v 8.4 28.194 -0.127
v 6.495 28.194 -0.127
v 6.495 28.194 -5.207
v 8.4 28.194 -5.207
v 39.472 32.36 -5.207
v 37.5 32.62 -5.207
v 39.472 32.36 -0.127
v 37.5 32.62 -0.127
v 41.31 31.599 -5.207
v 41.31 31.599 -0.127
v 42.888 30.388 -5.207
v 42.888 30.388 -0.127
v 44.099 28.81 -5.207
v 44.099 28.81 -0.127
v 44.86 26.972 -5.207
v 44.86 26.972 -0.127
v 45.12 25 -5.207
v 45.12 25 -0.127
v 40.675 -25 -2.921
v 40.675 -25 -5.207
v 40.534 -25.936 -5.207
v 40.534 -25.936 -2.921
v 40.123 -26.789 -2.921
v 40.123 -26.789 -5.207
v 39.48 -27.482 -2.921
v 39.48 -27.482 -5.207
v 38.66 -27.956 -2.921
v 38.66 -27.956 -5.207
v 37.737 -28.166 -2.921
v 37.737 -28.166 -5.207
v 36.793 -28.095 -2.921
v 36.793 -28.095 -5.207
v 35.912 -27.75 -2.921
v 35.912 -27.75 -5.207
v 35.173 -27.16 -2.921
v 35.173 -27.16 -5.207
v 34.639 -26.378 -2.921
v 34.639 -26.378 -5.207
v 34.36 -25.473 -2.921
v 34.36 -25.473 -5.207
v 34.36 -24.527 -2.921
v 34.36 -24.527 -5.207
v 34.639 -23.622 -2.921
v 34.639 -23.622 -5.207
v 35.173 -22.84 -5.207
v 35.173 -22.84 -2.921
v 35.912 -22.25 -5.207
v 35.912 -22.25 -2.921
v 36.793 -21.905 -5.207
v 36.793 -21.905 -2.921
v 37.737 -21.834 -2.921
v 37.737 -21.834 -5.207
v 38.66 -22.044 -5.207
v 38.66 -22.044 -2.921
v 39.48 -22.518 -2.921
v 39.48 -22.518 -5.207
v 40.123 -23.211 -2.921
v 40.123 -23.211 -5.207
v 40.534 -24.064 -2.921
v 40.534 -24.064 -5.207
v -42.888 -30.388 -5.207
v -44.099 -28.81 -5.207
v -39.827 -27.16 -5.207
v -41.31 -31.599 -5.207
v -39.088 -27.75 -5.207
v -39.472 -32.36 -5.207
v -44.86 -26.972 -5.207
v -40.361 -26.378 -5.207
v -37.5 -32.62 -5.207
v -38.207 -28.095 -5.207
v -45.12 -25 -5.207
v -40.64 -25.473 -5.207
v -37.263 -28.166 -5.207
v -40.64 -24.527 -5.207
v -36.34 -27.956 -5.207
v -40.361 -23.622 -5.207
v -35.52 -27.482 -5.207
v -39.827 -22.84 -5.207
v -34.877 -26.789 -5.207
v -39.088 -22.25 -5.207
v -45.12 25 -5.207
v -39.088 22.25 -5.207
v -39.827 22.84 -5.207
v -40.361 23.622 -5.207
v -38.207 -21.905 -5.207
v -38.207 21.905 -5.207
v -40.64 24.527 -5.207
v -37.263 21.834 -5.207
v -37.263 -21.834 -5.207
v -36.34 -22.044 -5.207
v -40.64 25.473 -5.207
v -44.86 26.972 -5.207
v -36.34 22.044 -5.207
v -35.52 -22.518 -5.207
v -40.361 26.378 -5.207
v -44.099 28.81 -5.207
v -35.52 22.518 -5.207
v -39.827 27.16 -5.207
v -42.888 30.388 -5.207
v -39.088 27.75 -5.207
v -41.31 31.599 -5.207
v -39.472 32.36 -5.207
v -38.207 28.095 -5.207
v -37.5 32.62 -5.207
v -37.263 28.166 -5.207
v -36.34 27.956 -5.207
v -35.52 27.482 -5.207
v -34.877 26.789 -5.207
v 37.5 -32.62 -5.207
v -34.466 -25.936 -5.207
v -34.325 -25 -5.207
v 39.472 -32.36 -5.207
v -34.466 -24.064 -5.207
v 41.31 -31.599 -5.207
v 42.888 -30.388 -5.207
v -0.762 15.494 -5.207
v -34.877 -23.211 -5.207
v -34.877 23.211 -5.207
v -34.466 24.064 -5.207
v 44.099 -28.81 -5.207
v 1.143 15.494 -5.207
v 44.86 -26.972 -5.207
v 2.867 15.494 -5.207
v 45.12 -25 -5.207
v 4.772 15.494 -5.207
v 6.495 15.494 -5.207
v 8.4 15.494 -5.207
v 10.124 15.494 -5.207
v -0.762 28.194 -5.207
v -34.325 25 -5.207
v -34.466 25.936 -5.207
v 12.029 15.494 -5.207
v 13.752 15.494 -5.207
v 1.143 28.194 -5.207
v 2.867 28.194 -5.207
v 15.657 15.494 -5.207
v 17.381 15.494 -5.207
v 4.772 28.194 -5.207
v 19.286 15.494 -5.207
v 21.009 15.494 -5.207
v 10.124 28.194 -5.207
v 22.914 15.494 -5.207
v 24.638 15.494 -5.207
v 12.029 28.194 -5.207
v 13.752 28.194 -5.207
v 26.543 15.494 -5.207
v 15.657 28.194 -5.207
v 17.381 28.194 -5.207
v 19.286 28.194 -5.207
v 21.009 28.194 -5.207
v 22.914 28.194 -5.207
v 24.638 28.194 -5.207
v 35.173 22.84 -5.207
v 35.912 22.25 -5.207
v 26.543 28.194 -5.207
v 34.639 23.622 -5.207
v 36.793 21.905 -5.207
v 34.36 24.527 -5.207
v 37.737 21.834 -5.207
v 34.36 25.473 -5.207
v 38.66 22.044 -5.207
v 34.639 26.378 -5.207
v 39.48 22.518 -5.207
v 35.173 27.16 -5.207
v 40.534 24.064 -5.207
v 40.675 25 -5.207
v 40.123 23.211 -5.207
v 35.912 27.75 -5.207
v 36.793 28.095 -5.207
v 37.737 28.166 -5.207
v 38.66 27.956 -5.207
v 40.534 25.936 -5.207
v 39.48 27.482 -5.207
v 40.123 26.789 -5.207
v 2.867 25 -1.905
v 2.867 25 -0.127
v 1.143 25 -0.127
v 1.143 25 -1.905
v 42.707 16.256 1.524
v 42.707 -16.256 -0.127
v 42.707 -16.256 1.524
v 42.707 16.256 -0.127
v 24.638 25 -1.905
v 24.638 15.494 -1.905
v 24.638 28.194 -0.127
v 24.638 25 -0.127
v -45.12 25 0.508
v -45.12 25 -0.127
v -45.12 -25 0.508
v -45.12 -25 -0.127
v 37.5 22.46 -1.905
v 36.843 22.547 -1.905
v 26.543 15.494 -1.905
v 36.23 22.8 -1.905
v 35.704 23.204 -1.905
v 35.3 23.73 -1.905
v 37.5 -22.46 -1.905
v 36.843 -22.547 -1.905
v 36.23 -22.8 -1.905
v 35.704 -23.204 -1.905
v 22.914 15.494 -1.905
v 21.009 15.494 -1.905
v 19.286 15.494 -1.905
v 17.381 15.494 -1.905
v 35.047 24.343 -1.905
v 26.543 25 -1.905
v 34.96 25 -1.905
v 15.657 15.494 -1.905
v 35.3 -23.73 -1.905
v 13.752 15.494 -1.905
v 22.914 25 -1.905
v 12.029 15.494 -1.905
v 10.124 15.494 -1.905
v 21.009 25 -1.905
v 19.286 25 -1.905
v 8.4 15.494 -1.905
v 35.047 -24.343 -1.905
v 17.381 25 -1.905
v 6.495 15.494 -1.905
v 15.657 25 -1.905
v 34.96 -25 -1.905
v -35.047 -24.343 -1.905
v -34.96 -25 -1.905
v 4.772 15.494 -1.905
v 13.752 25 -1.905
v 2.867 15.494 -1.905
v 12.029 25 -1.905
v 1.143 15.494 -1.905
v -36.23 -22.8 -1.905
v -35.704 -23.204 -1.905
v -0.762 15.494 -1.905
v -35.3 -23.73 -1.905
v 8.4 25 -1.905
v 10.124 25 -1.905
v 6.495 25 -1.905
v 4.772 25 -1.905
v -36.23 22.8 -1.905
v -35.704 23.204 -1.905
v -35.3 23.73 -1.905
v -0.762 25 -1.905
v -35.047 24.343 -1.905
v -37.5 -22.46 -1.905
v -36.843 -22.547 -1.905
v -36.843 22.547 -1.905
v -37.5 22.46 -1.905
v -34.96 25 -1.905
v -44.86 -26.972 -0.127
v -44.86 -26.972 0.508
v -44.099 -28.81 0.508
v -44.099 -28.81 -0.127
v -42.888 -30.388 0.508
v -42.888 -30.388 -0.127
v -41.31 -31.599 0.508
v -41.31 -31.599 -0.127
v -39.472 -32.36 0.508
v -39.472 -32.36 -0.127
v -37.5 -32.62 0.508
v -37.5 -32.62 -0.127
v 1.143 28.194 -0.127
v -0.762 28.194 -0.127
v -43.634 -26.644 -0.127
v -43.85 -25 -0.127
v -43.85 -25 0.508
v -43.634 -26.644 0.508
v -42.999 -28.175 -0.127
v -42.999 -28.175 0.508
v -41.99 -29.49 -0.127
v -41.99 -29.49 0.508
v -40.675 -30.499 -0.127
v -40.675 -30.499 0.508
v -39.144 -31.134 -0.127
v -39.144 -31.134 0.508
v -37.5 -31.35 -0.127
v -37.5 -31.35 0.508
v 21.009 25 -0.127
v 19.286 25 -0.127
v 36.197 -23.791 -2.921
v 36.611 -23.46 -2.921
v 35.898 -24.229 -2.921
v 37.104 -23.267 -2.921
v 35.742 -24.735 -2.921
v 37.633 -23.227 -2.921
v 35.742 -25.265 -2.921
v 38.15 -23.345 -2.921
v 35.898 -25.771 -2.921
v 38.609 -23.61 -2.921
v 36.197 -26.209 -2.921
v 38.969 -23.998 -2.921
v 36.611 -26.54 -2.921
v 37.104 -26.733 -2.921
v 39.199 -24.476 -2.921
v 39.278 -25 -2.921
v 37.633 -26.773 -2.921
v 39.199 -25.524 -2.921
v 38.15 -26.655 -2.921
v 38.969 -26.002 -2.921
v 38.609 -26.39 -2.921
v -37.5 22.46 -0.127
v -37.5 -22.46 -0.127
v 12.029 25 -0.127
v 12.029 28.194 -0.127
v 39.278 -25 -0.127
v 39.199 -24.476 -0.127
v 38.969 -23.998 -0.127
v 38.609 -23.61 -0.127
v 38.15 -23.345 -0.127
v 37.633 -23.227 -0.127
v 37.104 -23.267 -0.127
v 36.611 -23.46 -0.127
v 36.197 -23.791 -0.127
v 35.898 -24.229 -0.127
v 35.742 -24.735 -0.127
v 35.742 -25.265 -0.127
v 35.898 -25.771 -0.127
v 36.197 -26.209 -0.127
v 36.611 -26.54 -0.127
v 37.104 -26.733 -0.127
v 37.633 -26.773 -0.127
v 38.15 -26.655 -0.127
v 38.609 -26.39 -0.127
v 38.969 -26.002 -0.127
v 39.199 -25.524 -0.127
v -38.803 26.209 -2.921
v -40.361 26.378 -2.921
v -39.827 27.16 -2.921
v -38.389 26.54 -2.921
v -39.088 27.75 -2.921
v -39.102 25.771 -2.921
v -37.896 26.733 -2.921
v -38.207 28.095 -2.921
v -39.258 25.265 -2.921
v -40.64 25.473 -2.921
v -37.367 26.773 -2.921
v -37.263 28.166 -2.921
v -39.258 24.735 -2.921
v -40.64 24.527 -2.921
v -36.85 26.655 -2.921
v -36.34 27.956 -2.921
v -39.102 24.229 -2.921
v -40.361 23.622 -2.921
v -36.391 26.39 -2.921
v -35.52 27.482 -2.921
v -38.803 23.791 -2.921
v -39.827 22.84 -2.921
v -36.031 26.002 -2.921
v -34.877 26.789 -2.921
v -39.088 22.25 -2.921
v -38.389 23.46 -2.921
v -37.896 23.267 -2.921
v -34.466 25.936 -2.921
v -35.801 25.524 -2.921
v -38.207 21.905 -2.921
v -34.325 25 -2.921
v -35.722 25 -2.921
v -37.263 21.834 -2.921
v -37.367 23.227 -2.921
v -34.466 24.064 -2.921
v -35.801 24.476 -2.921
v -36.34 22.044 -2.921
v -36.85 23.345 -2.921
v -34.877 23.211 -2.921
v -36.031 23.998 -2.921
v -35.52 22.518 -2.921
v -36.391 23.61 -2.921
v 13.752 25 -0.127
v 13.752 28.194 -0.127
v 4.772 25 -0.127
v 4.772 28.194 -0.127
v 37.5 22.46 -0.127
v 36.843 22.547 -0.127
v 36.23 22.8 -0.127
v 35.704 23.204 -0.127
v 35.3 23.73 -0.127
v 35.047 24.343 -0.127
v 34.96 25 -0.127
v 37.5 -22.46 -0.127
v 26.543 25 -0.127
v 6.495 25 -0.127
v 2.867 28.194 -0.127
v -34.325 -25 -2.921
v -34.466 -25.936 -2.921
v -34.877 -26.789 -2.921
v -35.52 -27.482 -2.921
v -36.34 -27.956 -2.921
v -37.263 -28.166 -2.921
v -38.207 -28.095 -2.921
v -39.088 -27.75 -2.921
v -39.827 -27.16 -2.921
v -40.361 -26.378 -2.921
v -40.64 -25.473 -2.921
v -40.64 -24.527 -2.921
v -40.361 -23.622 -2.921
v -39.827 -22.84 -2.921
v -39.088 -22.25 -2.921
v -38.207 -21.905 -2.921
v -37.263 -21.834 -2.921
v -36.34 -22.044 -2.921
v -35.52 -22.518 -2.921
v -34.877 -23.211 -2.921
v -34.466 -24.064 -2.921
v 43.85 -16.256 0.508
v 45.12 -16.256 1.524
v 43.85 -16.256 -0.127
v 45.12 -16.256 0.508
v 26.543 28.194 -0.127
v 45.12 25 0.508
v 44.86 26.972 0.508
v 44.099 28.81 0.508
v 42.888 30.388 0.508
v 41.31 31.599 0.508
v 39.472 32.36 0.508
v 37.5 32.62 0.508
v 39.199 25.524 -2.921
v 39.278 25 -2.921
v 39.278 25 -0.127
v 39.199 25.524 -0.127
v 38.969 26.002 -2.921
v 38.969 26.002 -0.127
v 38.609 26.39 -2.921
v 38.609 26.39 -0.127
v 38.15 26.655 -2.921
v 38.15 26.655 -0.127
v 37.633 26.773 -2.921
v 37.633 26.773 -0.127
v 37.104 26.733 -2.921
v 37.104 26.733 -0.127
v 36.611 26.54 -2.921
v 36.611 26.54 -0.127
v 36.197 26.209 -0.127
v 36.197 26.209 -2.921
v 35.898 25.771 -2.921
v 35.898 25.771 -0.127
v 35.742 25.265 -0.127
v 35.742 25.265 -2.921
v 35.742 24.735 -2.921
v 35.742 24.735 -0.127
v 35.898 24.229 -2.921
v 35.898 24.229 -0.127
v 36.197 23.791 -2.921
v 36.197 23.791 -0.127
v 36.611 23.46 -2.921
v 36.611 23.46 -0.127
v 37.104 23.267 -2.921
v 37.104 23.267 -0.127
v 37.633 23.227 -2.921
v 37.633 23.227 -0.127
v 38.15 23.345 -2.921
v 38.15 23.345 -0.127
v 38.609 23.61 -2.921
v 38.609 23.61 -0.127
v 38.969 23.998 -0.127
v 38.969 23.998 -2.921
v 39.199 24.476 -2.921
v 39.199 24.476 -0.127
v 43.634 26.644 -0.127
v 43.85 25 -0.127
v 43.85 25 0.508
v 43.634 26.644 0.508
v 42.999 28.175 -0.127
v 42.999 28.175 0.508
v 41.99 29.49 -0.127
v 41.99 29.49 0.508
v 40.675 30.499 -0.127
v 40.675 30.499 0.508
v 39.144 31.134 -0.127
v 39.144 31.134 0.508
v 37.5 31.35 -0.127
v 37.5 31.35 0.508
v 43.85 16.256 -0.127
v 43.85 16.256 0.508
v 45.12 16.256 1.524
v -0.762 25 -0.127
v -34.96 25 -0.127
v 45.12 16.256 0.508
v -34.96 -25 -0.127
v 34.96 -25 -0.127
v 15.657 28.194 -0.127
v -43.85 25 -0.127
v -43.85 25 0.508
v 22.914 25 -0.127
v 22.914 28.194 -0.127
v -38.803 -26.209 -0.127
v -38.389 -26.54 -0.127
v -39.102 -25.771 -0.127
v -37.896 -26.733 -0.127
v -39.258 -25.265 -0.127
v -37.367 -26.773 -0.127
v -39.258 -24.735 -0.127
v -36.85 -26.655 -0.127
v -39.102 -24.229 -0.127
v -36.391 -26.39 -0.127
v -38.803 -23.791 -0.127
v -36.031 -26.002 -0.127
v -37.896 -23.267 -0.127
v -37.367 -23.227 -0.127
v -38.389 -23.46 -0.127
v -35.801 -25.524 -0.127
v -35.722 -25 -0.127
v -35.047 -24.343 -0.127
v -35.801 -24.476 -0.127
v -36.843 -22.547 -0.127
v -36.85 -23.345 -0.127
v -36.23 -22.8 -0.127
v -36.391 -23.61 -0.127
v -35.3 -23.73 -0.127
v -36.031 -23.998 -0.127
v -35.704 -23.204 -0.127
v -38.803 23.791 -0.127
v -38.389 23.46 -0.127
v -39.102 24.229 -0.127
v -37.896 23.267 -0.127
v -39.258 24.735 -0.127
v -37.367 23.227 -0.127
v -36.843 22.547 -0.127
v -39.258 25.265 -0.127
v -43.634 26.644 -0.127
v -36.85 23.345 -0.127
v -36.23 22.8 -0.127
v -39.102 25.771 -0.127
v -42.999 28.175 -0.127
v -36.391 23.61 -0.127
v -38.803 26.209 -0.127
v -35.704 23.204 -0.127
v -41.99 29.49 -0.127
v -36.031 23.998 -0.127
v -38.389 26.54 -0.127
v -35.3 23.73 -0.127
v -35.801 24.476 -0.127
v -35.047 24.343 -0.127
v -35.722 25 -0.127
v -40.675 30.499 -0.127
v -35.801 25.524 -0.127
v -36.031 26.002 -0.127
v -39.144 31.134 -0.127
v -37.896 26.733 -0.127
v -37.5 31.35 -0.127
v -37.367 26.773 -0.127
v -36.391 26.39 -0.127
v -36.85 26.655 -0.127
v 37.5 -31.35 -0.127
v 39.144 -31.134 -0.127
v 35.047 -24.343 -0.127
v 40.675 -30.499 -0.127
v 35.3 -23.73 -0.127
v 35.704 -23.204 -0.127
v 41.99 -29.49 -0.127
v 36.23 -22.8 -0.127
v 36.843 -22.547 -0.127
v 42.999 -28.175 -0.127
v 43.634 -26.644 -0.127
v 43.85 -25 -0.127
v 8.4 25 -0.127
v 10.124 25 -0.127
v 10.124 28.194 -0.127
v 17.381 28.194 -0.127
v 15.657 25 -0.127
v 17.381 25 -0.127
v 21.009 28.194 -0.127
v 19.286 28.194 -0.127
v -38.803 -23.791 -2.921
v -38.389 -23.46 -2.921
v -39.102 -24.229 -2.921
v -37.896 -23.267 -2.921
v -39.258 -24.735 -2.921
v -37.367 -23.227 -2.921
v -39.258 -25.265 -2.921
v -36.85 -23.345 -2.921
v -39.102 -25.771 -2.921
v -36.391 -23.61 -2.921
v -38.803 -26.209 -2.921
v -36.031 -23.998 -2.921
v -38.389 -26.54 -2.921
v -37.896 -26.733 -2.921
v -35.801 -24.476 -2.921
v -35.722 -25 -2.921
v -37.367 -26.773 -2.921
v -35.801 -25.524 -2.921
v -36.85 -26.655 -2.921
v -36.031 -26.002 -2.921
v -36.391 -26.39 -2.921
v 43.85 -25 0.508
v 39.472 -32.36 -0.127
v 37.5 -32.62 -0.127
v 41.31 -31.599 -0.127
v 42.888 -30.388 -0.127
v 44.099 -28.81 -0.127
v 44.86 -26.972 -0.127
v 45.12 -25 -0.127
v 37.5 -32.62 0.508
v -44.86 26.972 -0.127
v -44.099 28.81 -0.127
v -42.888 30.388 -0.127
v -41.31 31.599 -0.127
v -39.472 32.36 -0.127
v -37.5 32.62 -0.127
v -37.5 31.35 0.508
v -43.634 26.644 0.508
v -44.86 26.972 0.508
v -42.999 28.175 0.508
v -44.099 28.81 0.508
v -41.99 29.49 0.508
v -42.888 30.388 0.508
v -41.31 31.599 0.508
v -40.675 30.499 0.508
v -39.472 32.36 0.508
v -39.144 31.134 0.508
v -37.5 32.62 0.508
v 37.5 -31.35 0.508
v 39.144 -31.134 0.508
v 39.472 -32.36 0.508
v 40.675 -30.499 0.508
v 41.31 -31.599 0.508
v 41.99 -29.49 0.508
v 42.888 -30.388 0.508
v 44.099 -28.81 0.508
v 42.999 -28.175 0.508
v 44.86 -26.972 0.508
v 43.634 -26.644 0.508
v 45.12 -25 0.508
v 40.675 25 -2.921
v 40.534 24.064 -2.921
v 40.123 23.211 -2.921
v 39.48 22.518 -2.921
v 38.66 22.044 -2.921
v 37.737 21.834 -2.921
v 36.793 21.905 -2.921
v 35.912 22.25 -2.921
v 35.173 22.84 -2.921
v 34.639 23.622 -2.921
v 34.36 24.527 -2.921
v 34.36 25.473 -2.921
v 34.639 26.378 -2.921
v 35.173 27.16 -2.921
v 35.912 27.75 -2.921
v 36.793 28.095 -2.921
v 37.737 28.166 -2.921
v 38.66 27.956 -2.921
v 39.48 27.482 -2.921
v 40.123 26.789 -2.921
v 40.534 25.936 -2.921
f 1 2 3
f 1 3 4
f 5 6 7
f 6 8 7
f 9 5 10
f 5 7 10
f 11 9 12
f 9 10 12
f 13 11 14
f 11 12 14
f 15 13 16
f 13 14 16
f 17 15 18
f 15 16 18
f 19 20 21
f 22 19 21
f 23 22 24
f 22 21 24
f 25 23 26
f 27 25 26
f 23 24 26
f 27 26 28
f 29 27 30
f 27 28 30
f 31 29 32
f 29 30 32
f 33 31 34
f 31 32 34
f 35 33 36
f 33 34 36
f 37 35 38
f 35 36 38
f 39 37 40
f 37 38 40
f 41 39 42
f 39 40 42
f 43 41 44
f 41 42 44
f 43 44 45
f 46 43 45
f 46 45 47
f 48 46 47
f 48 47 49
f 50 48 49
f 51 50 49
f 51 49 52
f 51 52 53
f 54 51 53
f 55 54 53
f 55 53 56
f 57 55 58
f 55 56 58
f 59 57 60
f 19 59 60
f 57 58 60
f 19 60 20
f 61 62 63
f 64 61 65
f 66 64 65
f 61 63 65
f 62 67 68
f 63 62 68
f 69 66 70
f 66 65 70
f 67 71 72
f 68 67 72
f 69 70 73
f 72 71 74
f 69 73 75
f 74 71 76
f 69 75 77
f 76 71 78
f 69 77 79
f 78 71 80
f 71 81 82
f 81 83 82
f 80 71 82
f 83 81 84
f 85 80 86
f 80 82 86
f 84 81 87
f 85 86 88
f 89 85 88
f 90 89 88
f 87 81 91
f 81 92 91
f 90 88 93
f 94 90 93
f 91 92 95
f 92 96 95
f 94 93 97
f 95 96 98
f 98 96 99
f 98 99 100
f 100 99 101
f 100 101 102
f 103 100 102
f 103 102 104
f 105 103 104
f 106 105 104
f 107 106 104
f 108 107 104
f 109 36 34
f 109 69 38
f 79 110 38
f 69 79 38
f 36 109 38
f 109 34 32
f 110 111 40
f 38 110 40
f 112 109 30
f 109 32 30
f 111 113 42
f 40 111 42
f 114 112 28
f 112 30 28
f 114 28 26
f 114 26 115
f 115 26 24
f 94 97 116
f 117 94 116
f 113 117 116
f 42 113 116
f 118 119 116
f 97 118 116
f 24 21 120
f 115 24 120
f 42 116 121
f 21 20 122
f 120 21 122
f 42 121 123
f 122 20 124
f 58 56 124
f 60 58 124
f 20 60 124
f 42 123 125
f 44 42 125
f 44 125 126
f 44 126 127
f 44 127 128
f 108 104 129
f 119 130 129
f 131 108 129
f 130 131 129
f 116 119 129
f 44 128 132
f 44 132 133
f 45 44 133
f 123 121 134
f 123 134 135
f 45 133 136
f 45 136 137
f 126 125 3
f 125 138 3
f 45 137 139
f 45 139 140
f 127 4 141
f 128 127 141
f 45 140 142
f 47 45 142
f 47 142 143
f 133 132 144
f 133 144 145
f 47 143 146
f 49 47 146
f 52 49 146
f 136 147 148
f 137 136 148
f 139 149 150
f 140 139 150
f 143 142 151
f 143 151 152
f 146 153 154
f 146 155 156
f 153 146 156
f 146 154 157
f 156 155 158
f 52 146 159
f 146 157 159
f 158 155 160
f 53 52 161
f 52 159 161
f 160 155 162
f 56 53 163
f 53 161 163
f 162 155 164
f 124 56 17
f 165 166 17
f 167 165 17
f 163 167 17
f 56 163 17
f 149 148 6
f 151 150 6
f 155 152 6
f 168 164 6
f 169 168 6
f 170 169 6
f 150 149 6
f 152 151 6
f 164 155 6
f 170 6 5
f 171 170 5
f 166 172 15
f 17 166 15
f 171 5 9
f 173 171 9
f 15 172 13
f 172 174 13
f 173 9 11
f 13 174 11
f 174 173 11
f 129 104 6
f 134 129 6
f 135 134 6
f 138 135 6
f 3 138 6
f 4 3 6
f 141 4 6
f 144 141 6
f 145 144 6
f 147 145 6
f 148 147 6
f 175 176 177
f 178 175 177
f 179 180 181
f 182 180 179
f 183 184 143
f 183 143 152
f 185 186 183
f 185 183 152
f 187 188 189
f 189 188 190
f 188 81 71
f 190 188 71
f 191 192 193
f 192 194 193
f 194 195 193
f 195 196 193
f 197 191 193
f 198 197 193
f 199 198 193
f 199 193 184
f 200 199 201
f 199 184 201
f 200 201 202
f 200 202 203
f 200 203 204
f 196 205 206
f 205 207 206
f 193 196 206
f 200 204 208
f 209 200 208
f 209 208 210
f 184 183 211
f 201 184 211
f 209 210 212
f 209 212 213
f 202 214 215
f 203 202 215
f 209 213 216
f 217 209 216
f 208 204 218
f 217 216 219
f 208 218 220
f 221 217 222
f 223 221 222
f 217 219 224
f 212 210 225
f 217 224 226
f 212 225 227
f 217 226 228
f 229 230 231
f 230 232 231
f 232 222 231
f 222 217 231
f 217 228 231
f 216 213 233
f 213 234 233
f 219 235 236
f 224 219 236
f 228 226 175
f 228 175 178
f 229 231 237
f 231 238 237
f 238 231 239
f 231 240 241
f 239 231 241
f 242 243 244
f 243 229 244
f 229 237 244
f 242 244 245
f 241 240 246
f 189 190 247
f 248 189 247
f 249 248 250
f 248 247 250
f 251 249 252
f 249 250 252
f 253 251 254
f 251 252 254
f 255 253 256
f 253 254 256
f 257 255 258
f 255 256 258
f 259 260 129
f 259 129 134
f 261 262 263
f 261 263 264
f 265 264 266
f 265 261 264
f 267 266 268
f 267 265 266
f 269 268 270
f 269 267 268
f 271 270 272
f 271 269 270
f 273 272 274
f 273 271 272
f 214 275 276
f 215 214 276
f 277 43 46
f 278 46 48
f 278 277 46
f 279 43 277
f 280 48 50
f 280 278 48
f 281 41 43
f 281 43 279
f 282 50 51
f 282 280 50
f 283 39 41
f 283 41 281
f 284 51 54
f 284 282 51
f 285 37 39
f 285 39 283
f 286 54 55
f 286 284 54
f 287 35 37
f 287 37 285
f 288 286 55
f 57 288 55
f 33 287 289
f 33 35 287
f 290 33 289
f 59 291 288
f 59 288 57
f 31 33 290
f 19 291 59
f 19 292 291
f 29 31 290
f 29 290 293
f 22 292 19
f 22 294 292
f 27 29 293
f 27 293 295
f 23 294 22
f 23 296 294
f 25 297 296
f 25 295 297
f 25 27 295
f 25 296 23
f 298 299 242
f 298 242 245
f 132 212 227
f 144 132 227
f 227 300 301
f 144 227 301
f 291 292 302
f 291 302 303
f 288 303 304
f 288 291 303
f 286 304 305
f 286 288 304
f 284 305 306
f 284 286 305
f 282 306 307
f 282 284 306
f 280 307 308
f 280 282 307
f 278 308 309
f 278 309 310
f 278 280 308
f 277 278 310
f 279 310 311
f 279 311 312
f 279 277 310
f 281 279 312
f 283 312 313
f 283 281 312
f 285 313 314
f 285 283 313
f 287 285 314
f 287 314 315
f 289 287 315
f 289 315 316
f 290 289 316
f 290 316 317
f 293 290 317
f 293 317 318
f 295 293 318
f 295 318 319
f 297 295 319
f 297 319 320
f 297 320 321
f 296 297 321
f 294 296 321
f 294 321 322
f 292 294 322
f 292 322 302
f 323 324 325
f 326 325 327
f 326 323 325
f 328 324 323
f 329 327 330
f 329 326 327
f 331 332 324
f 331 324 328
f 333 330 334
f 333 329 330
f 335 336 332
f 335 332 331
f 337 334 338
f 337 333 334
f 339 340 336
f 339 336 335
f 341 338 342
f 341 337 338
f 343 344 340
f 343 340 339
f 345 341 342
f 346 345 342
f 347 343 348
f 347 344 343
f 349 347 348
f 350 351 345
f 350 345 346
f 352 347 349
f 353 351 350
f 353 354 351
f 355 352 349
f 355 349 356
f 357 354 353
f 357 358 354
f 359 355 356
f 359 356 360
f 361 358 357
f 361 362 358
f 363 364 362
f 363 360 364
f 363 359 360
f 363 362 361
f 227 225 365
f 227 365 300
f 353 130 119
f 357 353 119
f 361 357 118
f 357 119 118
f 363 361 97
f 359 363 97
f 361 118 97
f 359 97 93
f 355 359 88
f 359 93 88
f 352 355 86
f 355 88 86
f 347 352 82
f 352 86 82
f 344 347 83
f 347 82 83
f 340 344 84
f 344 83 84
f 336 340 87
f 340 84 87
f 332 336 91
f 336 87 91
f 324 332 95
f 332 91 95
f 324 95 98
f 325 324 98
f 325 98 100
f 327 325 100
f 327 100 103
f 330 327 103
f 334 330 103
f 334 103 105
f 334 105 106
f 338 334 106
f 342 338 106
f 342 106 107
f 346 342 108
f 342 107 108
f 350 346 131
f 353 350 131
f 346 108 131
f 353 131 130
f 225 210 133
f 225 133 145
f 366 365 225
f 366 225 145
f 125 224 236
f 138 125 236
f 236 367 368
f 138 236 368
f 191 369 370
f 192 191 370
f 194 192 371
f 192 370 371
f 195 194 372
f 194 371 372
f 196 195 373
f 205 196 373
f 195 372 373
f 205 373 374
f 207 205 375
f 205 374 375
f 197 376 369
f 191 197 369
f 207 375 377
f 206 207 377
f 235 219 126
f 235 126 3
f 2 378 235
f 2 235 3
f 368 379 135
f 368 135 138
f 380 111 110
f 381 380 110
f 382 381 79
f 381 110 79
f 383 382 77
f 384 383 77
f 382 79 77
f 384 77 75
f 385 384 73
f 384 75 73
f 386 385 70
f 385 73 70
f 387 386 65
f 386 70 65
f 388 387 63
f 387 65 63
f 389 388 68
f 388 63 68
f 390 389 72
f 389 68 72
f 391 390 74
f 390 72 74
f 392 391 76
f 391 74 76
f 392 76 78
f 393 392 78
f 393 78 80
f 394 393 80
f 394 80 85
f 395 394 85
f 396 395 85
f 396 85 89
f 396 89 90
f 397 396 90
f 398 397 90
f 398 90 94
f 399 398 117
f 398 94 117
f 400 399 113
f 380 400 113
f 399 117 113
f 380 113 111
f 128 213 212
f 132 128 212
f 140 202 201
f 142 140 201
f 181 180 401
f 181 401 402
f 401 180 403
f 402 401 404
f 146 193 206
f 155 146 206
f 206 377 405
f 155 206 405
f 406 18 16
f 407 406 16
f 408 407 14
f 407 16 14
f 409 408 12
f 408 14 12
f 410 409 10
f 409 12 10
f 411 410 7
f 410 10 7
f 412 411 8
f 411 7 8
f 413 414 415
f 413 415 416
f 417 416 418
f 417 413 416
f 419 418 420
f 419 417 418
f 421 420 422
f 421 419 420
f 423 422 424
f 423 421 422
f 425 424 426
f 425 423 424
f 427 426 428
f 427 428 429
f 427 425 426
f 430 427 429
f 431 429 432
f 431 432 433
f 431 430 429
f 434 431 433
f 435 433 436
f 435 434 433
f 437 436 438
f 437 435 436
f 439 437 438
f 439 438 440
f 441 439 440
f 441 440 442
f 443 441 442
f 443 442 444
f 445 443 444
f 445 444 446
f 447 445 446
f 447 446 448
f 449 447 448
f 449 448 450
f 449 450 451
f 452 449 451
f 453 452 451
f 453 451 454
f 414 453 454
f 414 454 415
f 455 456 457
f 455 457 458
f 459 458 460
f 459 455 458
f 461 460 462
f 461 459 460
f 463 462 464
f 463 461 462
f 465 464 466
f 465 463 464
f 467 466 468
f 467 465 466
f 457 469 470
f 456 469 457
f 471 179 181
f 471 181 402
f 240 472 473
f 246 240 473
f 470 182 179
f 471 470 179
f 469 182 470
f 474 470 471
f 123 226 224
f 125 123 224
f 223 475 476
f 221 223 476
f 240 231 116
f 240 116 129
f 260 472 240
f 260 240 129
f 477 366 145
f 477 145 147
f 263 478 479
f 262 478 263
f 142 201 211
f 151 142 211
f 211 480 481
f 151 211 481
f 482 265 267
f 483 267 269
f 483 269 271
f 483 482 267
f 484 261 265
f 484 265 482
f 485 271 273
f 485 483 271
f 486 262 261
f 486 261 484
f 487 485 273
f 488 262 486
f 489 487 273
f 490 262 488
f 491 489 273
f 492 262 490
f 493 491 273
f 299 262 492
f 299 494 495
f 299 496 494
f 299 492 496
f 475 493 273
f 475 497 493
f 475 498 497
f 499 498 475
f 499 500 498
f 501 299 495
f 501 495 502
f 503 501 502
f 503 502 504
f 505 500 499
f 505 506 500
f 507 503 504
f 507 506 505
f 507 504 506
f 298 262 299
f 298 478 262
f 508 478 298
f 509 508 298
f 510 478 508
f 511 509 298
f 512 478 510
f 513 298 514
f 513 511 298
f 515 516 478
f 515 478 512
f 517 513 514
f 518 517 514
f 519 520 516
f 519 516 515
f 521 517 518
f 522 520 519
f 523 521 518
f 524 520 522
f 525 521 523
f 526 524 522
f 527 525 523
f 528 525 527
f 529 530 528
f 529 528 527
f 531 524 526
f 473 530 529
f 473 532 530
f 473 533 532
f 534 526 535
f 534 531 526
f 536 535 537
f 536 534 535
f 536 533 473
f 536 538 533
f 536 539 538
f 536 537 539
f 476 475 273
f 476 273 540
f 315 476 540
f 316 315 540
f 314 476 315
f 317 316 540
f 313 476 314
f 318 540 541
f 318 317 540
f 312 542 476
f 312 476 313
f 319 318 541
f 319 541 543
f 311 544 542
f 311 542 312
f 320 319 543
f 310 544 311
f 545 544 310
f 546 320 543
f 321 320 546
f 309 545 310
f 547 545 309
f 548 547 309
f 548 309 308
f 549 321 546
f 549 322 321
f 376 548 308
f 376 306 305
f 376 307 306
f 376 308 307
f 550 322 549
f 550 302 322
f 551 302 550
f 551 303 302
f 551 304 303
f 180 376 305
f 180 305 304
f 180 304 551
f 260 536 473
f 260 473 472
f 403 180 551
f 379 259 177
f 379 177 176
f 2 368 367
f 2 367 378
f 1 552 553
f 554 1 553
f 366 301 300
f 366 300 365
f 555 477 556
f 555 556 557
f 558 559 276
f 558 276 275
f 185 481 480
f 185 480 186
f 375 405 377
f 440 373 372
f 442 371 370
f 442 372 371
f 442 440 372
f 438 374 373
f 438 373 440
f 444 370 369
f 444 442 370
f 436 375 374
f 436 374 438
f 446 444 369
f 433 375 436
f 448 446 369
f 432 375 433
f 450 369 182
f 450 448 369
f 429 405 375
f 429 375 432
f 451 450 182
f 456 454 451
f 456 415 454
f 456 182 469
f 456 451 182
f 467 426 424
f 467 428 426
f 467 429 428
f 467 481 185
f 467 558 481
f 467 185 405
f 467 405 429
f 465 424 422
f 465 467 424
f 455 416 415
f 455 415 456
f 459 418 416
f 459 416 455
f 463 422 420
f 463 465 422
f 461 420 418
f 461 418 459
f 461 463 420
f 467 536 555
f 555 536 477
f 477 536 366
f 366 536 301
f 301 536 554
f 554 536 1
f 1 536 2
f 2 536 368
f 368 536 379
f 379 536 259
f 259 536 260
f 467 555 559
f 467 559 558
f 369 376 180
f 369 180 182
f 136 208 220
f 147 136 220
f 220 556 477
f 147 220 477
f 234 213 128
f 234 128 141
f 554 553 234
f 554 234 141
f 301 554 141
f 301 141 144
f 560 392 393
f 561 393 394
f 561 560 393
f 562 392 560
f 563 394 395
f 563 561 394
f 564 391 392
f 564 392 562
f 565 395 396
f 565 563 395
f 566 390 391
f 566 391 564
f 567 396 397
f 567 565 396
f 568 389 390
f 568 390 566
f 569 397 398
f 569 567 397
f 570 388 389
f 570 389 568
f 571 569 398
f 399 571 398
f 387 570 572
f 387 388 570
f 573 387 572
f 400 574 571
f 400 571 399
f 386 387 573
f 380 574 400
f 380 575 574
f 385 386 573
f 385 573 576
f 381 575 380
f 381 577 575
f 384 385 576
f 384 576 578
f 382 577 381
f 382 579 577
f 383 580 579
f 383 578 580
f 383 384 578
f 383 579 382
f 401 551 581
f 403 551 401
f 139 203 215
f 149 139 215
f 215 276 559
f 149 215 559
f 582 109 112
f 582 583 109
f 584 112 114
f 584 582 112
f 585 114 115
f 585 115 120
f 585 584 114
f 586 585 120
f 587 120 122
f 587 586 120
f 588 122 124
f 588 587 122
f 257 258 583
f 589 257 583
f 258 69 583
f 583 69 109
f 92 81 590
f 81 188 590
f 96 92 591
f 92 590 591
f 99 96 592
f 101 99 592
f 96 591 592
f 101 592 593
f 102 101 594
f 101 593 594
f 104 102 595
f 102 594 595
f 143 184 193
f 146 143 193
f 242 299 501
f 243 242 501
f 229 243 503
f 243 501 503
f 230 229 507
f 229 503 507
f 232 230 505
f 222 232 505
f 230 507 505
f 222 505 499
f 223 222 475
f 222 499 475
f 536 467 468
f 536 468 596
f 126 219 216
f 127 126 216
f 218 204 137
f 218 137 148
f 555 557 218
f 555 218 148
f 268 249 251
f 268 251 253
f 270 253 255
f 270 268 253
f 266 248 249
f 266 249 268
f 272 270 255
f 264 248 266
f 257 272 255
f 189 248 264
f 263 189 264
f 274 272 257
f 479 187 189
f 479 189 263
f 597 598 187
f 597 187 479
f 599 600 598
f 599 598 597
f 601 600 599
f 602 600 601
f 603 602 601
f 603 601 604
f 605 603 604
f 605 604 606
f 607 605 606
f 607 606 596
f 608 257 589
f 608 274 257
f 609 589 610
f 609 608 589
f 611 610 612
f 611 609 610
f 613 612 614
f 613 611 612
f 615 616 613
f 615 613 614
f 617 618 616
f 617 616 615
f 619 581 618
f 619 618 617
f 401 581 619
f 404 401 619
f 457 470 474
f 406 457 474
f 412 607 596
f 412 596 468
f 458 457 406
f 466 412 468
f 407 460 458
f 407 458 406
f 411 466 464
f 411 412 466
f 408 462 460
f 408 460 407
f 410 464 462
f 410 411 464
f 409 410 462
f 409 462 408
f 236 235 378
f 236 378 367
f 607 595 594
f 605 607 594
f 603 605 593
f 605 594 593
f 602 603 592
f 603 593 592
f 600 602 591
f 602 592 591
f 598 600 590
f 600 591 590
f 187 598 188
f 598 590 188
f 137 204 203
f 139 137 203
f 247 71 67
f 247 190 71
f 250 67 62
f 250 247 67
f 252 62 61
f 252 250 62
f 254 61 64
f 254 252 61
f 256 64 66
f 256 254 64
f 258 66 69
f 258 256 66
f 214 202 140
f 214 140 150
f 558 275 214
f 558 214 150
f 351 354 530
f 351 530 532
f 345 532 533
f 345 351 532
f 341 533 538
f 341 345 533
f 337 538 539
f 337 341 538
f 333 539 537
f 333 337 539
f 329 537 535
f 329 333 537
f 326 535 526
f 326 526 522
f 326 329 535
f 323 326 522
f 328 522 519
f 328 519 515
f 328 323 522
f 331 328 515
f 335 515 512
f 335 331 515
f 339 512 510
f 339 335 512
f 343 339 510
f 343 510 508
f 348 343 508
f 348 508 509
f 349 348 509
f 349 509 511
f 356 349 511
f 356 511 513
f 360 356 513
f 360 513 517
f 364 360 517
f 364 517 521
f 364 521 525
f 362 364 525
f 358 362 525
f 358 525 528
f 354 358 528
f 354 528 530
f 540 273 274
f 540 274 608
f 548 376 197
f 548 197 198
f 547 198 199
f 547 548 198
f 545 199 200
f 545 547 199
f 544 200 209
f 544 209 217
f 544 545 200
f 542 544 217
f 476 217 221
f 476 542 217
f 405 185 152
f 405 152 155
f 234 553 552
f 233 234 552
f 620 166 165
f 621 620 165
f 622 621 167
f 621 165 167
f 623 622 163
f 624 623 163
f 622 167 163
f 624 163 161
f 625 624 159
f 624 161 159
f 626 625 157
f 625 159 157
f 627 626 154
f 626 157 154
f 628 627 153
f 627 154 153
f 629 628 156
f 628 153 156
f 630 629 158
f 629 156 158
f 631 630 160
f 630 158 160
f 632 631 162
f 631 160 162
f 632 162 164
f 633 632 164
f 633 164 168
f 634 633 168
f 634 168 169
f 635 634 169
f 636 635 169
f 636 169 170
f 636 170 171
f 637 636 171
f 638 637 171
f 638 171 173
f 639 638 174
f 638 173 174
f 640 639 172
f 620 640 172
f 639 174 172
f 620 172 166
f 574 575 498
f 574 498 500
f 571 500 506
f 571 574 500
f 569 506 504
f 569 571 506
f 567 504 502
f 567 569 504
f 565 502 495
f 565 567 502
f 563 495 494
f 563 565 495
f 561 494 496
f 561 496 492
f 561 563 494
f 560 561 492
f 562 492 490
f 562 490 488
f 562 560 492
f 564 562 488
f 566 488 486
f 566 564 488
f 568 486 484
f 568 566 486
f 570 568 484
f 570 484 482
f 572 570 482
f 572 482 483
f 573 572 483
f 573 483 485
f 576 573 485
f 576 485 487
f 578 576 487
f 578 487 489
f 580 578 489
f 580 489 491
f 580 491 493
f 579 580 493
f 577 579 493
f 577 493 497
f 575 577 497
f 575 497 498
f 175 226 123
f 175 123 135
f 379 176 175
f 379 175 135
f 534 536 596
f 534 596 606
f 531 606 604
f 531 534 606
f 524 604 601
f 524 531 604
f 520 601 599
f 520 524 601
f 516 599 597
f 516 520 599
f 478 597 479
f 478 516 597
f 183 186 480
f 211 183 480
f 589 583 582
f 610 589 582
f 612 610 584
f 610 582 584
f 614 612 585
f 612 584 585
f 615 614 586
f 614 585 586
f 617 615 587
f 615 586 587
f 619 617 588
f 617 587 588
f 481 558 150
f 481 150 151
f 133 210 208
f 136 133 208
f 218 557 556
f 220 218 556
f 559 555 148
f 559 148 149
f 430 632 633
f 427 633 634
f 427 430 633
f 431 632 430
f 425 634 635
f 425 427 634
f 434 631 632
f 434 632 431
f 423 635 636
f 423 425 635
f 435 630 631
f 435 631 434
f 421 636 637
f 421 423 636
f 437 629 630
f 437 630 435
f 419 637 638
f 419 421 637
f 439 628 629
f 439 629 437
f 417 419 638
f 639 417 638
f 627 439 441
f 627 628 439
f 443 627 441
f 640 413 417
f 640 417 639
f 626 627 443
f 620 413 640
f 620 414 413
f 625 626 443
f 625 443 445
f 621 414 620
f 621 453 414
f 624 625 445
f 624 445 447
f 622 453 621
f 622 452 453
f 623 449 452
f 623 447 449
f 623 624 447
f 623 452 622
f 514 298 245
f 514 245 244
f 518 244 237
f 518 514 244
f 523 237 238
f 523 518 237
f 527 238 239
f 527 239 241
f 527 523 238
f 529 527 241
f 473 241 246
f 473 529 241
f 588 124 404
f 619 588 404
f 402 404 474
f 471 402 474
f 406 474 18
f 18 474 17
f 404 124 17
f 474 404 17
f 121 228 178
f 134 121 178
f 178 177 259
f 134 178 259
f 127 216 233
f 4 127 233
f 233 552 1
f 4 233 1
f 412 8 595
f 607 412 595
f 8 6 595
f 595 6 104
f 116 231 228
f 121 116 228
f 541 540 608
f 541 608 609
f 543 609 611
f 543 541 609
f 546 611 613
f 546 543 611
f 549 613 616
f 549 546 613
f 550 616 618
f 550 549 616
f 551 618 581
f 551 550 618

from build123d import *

# Parameters (mm, degrees)
SKETCH_W                = 90.24
SKETCH_H                = 65.24
SKETCH_R                = 1.778
PAD_DEPTH               = 5.08
POCKET_DEPTH            = 1.778
POCKET_MIRRORED_2_DEPTH = 1.778
SKETCH002_R             = 3.175
POCKET001_DEPTH         = 2.286
SKETCH003_W             = 1.905
SKETCH003_H             = 12.7
POCKET002_DEPTH         = 5.081
LINEARPATTERN_COUNT     = 8
LINEARPATTERN_PITCH     = 3.628571
FILLET_R                = 7.62
PAD001_DEPTH            = 0.635
SKETCH020_W             = 2.413
SKETCH020_H             = 32.512
PAD005_DEPTH            = 1.651


with BuildPart() as part:
    # Sketch → Pad (new body)
    with BuildSketch(Plane.XY):
        Rectangle(SKETCH_W, SKETCH_H)
        with Locations((37.5, 25)):
            Circle(SKETCH_R, mode=Mode.SUBTRACT)
        with Locations((-37.5, 25)):
            Circle(SKETCH_R, mode=Mode.SUBTRACT)
        with Locations((-37.5, -25)):
            Circle(SKETCH_R, mode=Mode.SUBTRACT)
        with Locations((37.5, -25)):
            Circle(SKETCH_R, mode=Mode.SUBTRACT)
    extrude(amount=PAD_DEPTH)

    # Sketch001 (on Face10 of Pad) → Pocket (cut)
    with BuildSketch(Plane.XY.offset(5.08)):
        with BuildLine():
            ThreePointArc((-37.5, 22.46), (-35.703949, 23.203949), (-34.96, 25))
            Line((-34.96, 25), (0, 25))
            Line((0, 0), (0, 25))
            Line((0, 0), (-37.5, 0))
            Line((-37.5, 0), (-37.5, 22.46))
        make_face()
    pocket = extrude(amount=-POCKET_DEPTH, mode=Mode.SUBTRACT)

    # Sketch001 Mirrored 2 → Pocket Mirrored 2 (cut)
    with BuildSketch(Plane(origin=(0, 0, 5.08), x_dir=(-1, 0, 0), z_dir=(0, 0, -1))):
        with BuildLine():
            ThreePointArc((-37.5, 22.46), (-35.703949, 23.203949), (-34.96, 25))
            Line((-34.96, 25), (0, 25))
            Line((0, 0), (0, 25))
            Line((0, 0), (-37.5, 0))
            Line((-37.5, 0), (-37.5, 22.46))
        make_face()
    pocket_mirrored_2 = extrude(amount=POCKET_MIRRORED_2_DEPTH, mode=Mode.SUBTRACT)

    # Mirrored001: Pocket, Pocket Mirrored 2 across Sketch001 H_Axis
    add(pocket.mirror(Plane(origin=(0, 0, 5.08), x_dir=(0, 0, 1), z_dir=(0, 1, 0))), mode=Mode.SUBTRACT)
    add(pocket_mirrored_2.mirror(Plane(origin=(0, 0, 5.08), x_dir=(0, 0, 1), z_dir=(0, 1, 0))), mode=Mode.SUBTRACT)

    # Sketch002 (on Face4 of MultiTransform) → Pocket001 (cut)
    with BuildSketch(Plane(origin=(0, 0, 0), x_dir=(1, 0, 0), z_dir=(0, 0, -1))):
        with Locations((37.5, 25)):
            Circle(SKETCH002_R)
        with Locations((-37.5, 25)):
            Circle(SKETCH002_R)
        with Locations((-37.5, -25)):
            Circle(SKETCH002_R)
        with Locations((37.5, -25)):
            Circle(SKETCH002_R)
    extrude(amount=-POCKET001_DEPTH, mode=Mode.SUBTRACT)

    # Sketch003 (on Face5 of Pocket001) → Pocket002 (cut, through all)
    with BuildSketch(Plane.XY.offset(5.08)):
        with Locations((25.5905, 21.844)):
            Rectangle(SKETCH003_W, SKETCH003_H)
    pocket002 = extrude(amount=-POCKET002_DEPTH, mode=Mode.SUBTRACT)

    # LinearPattern: Pocket002 ×8
    with Locations(*[(-i * LINEARPATTERN_PITCH, 0, 0) for i in range(1, LINEARPATTERN_COUNT)]):
        add(pocket002, mode=Mode.SUBTRACT)

    # Fillet
    fillet_edges = [part.edges().sort_by_distance(p)[0] for p in [
        (45.12, -32.62, 2.54),
        (-45.12, -32.62, 2.54),
        (-45.12, 32.62, 2.54),
        (45.12, 32.62, 2.54),
    ]]
    fillet(fillet_edges, radius=FILLET_R)

    # Sketch004 (on Face5 of Fillet) → Pad001 (join)
    with BuildSketch(Plane.XY.offset(5.08)):
        with BuildLine():
            Line((-37.5, -32.62), (37.5, -32.62))
            ThreePointArc((37.5, -32.62), (42.888154, -30.388154), (45.12, -25))
            Line((45.12, -25), (45.12, 25))
            ThreePointArc((45.12, 25), (42.888154, 30.388154), (37.5, 32.62))
            Line((37.5, 32.62), (-37.5, 32.62))
            ThreePointArc((-37.5, 32.62), (-42.888154, 30.388154), (-45.12, 25))
            Line((-45.12, 25), (-45.12, -25))
            ThreePointArc((-45.12, -25), (-42.888154, -30.388154), (-37.5, -32.62))
        make_face()
        with BuildLine():
            Line((-37.5, -31.35), (37.5, -31.35))
            ThreePointArc((37.5, -31.35), (41.990128, -29.490128), (43.85, -25))
            Line((43.85, -25), (43.85, 25))
            ThreePointArc((43.85, 25), (41.990128, 29.490128), (37.5, 31.35))
            Line((37.5, 31.35), (-37.5, 31.35))
            ThreePointArc((-37.5, 31.35), (-41.990128, 29.490128), (-43.85, 25))
            Line((-43.85, 25), (-43.85, -25))
            ThreePointArc((-43.85, -25), (-41.990128, -29.490128), (-37.5, -31.35))
        make_face(mode=Mode.SUBTRACT)
    extrude(amount=PAD001_DEPTH)

    # Sketch020 (on Face58 of Pad001) → Pad005 (join)
    with BuildSketch(Plane.XY.offset(5.08)):
        with Locations((43.9135, 0)):
            Rectangle(SKETCH020_W, SKETCH020_H)
    extrude(amount=PAD005_DEPTH)


with BuildPart() as part_1:
    # Body placement: moved
    add(part.part.moved(Location((0, 0, -5.207))))


solid = part_1.part
